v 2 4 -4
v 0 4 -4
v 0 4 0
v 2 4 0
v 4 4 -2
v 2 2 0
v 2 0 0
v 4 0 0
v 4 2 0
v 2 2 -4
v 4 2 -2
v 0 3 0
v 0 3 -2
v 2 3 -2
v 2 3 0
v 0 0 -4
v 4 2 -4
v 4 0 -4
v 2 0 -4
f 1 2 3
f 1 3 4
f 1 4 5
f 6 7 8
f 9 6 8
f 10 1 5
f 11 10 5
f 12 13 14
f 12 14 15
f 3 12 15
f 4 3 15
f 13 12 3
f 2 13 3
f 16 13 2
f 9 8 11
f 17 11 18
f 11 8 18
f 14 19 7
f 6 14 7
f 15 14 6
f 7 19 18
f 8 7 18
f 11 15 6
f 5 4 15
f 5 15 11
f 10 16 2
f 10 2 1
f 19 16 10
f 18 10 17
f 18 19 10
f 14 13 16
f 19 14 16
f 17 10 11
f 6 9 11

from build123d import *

# Parameters (mm, degrees)
SKETCH5_W           = 4
SKETCH5_H           = 4
BOSS_EXTRUDE2_DEPTH = 4
SKETCH7_W           = 2
SKETCH7_H           = 3
CUT_EXTRUDE5_DEPTH  = 2
CUT_EXTRUDE8_DEPTH  = 2
CUT_EXTRUDE10_DEPTH = 2
CUT_EXTRUDE13_DEPTH = 2


with BuildPart() as part:
    # Sketch5 → Boss-Extrude2 (new body)
    with BuildSketch(Plane(origin=(0, 0, 0), x_dir=(1, 0, 0), z_dir=(0, 1, 0))):
        with Locations((2, 2)):
            Rectangle(SKETCH5_W, SKETCH5_H)
    extrude(amount=BOSS_EXTRUDE2_DEPTH)

    # Sketch7 → Cut-Extrude5 (cut)
    with BuildSketch(Plane.ZY):
        with Locations((-1, 1.5)):
            Rectangle(SKETCH7_W, SKETCH7_H)
    extrude(amount=-CUT_EXTRUDE5_DEPTH, mode=Mode.SUBTRACT)

    # Sketch11 → Cut-Extrude8 (cut)
    with BuildSketch(Plane(origin=(0, 4, 0), x_dir=(1, 0, 0), z_dir=(0, 1, 0))):
        Polygon((2, 0), (4, 2), (4, 0), align=None)
    extrude(amount=-CUT_EXTRUDE8_DEPTH, mode=Mode.SUBTRACT)

    # Sketch13 → Cut-Extrude10 (cut)
    with BuildSketch(Plane(origin=(0, 4, 0), x_dir=(1, 0, 0), z_dir=(0, 1, 0))):
        Polygon((2, 4), (4, 2), (4, 4), align=None)
    extrude(amount=-CUT_EXTRUDE10_DEPTH, mode=Mode.SUBTRACT)

    # Sketch14 → Cut-Extrude13 (cut)
    with BuildSketch(Plane.ZY):
        Polygon((-2, 3), (-4, 0), (-2, 0), align=None)
    extrude(amount=-CUT_EXTRUDE13_DEPTH, mode=Mode.SUBTRACT)


solid = part.part
